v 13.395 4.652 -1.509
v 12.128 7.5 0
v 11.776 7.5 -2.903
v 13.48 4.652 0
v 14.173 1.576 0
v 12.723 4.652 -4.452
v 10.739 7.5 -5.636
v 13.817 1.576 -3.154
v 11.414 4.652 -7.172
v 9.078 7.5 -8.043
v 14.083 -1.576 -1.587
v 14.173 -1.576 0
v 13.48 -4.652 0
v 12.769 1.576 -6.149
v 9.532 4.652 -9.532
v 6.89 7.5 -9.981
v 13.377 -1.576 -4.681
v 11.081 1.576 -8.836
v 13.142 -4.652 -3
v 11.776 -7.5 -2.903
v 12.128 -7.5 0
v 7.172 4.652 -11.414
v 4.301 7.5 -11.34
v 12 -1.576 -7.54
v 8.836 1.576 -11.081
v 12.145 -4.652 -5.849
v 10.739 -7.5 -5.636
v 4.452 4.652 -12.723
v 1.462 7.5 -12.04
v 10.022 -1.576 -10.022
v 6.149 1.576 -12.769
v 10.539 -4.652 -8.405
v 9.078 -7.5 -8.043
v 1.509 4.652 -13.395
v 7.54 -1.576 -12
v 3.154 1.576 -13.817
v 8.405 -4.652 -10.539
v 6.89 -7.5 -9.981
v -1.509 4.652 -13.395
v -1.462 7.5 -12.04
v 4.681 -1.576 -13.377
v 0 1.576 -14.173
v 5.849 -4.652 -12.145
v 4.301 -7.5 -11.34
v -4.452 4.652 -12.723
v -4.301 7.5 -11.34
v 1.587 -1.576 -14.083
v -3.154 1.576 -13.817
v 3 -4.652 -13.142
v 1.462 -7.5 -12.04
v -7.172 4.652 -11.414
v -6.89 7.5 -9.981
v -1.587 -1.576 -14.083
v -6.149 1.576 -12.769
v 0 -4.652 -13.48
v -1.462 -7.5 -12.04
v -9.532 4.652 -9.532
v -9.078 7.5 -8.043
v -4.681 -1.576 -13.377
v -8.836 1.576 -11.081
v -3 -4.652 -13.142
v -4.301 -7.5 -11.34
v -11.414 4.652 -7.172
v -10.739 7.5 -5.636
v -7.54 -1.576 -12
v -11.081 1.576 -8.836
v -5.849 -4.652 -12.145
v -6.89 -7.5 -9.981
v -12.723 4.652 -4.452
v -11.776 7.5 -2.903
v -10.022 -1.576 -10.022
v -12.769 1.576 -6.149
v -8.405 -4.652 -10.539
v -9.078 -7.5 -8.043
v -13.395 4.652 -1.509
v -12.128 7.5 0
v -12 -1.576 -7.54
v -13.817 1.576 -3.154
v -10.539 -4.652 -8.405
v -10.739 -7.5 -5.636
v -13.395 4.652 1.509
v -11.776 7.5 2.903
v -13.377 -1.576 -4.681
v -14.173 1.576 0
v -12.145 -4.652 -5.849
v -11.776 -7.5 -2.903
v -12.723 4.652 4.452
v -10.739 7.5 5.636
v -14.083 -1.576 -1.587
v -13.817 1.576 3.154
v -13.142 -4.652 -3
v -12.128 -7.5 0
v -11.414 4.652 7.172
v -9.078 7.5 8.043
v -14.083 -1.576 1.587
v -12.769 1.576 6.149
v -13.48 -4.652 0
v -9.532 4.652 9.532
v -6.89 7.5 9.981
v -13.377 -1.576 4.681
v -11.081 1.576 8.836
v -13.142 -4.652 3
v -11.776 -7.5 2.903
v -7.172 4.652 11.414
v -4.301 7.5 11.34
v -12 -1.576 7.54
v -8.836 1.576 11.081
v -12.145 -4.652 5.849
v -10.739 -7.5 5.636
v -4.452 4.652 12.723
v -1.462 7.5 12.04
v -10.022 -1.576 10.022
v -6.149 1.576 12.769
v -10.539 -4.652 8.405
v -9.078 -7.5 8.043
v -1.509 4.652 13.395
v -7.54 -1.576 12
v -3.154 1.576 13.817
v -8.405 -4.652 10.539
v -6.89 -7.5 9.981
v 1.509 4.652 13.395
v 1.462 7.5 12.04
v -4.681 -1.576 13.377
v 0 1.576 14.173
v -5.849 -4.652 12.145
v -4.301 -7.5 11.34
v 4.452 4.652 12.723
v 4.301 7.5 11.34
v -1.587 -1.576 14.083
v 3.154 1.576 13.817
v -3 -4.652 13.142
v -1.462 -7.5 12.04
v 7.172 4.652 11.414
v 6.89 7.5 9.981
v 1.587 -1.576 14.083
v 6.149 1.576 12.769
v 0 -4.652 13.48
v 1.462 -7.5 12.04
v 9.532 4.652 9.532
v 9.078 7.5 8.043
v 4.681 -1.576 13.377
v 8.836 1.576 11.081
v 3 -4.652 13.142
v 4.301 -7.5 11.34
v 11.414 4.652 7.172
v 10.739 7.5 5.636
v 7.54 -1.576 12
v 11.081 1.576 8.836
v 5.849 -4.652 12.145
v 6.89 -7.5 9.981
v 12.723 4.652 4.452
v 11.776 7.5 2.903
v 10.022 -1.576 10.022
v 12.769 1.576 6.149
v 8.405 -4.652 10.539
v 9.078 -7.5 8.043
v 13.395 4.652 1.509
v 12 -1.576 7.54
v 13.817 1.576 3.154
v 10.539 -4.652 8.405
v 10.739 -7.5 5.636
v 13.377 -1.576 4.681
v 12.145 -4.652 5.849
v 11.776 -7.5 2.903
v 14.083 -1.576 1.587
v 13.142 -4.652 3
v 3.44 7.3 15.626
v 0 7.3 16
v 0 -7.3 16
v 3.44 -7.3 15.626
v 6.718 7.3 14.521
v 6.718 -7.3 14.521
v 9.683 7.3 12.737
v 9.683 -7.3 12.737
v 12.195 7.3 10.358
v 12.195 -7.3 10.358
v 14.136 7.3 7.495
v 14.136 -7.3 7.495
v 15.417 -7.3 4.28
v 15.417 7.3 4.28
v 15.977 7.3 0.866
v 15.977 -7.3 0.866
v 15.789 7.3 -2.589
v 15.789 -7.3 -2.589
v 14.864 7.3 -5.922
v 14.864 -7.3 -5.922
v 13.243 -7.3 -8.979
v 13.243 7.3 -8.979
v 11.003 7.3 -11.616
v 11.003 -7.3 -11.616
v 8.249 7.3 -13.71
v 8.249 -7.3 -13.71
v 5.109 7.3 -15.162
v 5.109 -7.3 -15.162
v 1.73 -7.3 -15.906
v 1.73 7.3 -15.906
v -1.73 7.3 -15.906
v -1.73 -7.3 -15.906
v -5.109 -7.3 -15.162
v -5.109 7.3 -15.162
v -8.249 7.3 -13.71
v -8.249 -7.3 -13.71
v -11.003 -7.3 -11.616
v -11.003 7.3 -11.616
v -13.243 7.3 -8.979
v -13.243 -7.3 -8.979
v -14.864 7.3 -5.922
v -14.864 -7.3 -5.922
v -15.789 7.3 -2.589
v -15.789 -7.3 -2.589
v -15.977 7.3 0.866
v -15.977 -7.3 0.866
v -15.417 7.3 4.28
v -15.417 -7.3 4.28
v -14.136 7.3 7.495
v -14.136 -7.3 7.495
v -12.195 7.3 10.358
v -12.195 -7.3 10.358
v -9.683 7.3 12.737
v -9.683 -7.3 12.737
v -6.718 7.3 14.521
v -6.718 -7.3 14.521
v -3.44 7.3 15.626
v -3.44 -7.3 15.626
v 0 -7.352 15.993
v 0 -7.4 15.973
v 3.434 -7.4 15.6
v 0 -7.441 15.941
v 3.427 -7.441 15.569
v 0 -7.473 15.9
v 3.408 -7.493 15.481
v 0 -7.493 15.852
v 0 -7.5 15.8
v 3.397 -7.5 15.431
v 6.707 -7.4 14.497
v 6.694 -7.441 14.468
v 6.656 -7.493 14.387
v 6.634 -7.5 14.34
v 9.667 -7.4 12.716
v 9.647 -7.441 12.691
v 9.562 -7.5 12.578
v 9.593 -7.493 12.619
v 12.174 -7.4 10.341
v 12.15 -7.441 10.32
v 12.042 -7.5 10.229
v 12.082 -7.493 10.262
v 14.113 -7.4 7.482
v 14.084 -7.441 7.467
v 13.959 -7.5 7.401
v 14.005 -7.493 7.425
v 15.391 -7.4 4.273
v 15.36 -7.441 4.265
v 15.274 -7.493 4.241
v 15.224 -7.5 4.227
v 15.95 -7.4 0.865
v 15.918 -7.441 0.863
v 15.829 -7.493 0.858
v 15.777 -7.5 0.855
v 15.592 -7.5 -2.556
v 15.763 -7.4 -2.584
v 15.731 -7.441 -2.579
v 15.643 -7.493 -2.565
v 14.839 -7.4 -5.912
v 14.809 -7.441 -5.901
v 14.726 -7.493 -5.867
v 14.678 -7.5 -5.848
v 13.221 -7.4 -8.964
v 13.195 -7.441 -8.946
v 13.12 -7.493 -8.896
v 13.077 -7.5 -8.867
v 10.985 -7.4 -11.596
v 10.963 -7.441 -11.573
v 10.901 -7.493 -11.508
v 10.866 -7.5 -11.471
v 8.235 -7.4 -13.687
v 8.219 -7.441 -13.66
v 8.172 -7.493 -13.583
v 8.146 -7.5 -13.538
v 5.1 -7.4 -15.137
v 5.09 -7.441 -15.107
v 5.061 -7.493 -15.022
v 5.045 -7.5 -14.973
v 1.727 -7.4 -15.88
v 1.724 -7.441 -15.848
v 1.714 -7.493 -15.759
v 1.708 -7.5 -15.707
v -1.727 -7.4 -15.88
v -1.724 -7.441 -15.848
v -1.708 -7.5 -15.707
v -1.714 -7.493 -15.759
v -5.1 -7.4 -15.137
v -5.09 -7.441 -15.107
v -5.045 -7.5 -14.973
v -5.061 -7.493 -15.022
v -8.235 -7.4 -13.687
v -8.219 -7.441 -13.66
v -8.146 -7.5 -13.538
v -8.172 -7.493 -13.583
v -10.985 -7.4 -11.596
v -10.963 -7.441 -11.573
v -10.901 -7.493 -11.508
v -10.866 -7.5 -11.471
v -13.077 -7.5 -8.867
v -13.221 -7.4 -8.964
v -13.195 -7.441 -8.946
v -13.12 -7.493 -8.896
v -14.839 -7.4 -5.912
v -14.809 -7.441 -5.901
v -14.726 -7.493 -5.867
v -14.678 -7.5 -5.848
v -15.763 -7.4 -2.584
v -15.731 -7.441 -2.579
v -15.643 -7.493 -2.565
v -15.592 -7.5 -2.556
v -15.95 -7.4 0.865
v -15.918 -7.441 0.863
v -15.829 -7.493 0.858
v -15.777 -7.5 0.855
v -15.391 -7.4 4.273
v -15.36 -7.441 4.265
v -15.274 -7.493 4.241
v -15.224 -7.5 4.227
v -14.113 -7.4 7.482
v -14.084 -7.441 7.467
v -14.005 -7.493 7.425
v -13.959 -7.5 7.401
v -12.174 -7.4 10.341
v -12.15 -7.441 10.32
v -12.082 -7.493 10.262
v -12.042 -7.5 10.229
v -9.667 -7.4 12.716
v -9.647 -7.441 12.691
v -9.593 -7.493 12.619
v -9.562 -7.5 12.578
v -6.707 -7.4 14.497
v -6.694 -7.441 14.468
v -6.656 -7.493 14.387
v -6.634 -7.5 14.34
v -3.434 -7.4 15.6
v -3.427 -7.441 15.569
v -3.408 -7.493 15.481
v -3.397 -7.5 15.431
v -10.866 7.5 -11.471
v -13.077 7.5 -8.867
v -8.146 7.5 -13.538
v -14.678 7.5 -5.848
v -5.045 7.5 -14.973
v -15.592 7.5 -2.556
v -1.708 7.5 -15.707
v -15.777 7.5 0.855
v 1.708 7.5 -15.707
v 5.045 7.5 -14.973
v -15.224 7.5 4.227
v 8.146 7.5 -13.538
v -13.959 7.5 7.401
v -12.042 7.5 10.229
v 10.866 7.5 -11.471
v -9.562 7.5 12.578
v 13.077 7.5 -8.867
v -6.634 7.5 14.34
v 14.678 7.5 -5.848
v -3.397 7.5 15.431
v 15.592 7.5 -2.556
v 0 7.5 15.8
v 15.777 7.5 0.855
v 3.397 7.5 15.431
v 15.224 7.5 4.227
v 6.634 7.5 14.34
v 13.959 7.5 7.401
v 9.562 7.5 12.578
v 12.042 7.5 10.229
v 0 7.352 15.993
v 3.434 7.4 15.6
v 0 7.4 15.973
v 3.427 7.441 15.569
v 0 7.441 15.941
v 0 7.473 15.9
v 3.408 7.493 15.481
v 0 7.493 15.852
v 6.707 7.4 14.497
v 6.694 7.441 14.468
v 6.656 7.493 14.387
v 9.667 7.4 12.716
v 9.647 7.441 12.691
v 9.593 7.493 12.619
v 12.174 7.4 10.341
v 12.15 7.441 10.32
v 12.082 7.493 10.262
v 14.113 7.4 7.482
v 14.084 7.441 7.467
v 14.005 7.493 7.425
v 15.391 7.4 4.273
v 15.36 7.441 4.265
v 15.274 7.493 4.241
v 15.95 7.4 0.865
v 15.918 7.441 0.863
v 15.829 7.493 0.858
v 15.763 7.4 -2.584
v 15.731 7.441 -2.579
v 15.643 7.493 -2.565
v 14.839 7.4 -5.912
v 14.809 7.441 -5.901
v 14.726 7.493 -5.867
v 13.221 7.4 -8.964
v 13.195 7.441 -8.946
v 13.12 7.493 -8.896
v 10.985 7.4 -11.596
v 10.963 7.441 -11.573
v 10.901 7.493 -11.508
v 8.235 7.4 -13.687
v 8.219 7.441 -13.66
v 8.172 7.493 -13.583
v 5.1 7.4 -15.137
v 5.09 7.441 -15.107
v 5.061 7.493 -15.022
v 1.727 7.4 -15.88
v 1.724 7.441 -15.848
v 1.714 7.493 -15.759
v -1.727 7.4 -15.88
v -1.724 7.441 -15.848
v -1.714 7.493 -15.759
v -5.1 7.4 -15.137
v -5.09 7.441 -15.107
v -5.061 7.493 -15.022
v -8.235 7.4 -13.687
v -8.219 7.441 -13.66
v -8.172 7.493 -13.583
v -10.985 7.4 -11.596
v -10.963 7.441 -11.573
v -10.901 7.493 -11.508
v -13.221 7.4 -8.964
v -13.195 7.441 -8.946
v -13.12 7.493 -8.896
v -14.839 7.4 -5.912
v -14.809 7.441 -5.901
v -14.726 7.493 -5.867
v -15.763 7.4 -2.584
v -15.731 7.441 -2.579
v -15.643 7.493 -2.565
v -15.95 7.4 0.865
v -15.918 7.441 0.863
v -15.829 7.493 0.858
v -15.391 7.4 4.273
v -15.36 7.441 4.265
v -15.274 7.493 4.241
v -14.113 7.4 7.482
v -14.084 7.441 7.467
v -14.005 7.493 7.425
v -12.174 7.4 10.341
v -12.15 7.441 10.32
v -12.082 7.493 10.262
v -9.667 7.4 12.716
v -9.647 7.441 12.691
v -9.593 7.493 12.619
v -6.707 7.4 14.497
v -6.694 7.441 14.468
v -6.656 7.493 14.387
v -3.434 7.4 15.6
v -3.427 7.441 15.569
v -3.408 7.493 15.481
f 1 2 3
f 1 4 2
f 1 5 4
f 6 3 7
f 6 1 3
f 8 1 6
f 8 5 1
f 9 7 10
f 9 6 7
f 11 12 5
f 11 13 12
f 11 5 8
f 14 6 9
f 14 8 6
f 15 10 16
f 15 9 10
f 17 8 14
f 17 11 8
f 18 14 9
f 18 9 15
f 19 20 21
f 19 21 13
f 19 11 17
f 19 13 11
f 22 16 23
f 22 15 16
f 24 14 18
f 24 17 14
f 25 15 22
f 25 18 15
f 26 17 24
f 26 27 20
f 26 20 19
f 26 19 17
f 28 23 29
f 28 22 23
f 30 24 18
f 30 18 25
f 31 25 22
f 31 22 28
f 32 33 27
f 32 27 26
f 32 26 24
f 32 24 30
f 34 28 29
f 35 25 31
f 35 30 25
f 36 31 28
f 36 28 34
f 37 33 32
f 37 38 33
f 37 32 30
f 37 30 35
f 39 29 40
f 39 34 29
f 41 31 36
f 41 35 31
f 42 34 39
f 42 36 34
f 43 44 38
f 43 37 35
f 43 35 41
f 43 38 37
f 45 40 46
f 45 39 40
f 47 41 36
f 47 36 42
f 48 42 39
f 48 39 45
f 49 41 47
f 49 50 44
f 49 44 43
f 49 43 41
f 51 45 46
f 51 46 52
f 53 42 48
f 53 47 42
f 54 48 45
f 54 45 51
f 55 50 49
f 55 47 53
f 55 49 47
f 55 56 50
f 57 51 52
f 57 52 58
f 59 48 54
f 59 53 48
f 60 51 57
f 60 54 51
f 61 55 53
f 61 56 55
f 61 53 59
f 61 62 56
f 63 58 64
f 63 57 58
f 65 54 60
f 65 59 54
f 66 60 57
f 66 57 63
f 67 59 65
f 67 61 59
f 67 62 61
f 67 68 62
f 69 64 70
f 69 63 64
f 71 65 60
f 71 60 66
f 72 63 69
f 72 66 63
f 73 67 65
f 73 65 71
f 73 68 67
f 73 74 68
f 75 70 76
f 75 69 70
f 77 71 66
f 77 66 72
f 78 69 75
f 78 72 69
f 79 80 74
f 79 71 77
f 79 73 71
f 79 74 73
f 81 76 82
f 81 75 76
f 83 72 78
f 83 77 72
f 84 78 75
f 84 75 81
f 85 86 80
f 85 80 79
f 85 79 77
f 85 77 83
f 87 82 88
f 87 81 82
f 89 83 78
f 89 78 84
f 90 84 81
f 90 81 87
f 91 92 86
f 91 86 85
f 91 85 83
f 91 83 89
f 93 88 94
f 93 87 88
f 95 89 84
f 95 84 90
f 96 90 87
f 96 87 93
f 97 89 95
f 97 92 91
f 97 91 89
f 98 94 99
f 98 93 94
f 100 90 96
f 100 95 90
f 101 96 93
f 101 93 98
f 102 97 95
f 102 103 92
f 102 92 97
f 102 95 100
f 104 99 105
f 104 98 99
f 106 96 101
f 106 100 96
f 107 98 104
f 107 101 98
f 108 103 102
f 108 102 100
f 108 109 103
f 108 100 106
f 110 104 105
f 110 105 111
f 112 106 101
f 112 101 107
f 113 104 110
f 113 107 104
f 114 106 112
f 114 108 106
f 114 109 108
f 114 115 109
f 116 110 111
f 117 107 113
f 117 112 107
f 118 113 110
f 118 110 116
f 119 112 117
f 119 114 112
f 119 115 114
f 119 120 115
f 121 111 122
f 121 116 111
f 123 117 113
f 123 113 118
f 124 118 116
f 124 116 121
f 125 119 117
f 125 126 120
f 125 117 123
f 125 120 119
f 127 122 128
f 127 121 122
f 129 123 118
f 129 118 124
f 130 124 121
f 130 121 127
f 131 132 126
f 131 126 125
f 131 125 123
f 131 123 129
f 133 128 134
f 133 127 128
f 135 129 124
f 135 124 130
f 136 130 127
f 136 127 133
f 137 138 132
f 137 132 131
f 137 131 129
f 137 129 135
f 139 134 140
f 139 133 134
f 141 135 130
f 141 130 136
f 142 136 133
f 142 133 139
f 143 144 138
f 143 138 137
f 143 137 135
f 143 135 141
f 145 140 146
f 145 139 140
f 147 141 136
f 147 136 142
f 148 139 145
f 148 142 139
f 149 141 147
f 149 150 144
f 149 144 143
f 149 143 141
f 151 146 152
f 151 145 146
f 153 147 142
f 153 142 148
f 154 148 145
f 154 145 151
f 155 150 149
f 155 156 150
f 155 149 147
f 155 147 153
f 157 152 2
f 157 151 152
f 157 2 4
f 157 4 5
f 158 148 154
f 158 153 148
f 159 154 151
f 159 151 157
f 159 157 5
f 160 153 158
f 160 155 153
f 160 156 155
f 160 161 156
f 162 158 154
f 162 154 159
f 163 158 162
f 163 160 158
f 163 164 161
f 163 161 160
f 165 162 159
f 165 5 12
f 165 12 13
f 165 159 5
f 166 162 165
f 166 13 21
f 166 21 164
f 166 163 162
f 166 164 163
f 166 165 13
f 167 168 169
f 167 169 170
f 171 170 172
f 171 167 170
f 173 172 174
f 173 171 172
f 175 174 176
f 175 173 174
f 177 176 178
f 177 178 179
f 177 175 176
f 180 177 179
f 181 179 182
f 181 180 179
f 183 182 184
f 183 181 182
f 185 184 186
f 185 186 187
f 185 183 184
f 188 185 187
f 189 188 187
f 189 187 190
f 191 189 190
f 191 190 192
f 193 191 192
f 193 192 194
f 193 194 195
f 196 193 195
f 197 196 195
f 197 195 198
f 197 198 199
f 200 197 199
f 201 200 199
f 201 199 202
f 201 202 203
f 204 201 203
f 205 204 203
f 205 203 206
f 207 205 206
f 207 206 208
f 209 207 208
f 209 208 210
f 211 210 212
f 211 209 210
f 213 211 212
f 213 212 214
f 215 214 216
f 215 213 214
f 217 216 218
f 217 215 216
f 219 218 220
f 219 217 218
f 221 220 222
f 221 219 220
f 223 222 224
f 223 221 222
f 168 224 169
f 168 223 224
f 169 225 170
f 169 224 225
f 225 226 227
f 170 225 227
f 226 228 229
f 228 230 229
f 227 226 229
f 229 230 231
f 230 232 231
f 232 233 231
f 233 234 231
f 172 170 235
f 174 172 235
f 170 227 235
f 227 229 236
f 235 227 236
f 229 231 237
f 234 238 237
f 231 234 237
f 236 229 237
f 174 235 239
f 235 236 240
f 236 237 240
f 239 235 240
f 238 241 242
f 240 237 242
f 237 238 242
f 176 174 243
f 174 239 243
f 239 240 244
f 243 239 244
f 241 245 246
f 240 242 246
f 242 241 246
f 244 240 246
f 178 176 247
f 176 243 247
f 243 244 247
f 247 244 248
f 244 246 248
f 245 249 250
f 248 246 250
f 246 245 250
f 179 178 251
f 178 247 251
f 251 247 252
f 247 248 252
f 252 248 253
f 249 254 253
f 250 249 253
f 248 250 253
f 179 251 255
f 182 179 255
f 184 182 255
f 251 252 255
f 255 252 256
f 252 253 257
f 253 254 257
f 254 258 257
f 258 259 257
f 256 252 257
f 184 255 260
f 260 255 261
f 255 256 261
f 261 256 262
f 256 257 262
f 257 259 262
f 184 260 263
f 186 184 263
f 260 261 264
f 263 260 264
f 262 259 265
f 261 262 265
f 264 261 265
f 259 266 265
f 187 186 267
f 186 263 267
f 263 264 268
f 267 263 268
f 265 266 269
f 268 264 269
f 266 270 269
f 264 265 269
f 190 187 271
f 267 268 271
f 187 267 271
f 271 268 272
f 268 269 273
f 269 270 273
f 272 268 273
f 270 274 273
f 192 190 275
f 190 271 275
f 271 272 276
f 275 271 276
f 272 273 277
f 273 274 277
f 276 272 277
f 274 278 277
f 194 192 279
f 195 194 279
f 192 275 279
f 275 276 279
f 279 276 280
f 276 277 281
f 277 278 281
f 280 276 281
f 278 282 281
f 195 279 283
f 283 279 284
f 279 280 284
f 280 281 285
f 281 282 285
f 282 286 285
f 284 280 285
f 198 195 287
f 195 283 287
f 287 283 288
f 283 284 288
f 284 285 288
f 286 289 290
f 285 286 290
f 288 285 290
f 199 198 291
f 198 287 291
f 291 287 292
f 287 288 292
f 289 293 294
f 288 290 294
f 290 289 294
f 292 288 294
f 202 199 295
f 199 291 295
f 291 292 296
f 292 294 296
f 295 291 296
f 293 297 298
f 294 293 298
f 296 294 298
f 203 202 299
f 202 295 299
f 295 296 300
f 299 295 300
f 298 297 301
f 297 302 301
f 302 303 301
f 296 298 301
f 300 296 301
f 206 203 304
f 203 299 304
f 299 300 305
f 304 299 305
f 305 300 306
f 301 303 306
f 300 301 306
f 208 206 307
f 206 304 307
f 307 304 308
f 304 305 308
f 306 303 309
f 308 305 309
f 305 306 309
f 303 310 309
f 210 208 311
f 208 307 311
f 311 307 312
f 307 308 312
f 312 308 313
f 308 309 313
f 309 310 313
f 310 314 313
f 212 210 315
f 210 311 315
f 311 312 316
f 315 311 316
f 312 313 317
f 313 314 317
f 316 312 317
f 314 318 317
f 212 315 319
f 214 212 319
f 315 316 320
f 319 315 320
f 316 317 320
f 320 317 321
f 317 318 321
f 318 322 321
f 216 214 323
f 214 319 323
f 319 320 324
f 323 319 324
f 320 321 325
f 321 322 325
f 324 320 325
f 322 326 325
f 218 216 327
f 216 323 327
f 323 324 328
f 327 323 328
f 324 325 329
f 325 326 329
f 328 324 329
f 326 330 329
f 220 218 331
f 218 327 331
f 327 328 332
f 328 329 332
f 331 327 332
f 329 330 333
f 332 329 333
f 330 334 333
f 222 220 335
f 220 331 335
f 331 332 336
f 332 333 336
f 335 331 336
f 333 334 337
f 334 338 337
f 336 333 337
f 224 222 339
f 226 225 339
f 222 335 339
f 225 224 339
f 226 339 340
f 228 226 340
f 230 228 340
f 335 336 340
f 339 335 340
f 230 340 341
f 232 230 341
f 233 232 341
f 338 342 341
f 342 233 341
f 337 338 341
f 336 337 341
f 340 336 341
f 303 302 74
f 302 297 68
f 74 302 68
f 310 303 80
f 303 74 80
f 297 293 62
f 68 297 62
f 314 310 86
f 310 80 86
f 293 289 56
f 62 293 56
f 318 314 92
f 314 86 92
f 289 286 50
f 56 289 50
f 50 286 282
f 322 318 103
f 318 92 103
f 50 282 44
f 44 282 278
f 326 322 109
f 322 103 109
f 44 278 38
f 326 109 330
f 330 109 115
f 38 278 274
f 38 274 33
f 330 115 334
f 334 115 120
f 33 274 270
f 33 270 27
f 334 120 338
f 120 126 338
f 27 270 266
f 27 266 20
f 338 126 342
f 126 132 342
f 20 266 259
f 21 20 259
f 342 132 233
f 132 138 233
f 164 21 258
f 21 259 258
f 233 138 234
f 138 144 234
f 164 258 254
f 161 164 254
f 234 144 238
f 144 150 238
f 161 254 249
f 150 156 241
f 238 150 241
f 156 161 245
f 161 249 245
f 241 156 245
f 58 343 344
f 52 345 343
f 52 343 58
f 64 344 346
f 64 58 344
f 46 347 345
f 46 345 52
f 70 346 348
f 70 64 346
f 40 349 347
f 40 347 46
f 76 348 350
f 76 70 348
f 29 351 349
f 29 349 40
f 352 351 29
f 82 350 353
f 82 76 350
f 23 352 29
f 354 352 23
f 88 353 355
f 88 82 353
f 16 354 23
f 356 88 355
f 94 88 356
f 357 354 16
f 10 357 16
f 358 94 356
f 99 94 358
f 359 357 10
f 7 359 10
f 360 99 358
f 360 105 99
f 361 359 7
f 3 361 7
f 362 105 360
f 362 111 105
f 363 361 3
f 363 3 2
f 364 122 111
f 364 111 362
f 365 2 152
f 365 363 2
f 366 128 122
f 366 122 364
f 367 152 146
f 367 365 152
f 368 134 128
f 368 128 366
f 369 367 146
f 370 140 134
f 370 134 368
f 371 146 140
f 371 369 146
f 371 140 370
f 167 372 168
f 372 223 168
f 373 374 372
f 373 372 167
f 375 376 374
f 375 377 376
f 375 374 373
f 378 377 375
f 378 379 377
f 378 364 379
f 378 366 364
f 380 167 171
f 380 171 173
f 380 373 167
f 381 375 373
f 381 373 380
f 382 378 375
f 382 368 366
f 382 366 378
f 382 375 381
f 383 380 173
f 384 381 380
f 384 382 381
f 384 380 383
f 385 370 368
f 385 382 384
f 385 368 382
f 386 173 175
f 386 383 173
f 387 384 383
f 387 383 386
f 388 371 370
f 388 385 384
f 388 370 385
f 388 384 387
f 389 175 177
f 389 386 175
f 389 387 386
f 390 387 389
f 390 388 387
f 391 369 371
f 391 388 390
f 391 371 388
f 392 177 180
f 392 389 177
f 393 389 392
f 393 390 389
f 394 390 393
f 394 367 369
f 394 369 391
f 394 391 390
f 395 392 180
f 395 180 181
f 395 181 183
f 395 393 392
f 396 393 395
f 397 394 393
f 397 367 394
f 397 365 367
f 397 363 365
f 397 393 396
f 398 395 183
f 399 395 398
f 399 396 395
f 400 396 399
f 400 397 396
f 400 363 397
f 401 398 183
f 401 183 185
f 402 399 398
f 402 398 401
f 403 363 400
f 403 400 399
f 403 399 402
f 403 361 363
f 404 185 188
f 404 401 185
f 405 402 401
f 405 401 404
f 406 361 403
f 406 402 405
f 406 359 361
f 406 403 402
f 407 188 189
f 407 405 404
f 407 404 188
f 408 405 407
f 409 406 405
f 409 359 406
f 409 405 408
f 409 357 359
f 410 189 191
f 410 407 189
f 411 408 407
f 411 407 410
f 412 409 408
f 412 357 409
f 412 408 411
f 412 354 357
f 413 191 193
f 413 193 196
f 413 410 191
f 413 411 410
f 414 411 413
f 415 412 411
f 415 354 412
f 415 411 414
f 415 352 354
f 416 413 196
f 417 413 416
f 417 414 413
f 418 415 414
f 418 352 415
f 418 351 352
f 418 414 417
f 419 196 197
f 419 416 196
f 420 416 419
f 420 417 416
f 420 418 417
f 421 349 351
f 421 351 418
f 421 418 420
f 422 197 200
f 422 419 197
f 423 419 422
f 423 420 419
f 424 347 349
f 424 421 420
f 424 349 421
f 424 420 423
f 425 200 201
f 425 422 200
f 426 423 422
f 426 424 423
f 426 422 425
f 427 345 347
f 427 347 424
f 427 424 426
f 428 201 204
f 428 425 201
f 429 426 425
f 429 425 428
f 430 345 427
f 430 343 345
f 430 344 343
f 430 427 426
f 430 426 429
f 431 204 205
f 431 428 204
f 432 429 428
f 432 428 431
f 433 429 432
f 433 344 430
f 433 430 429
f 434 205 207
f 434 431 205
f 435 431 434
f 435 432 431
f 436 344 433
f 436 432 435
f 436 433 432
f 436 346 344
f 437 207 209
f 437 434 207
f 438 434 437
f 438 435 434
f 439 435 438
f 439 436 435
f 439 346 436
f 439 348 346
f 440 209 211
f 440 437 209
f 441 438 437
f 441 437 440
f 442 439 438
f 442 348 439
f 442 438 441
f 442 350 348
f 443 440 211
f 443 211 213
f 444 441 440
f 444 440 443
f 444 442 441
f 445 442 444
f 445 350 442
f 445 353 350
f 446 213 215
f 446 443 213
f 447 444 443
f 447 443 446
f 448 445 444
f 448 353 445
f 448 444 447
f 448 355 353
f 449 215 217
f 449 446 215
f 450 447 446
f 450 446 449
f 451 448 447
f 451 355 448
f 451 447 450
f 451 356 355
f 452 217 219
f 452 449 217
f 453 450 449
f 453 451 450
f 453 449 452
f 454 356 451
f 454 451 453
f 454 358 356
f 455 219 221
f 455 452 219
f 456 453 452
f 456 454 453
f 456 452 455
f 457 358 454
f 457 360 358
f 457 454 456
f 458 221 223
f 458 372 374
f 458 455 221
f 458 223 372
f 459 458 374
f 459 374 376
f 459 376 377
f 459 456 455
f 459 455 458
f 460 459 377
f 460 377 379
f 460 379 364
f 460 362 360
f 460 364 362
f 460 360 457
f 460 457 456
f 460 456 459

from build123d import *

# Parameters (mm, degrees)
SZKIC1_R                    = 16
DODANIE_WYCI_GNI_CIE1_DEPTH = 7.5
ZAOKR_GLENIE1_R             = 0.2


with BuildPart() as part:
    # Szkic1 → Dodanie-wyciągnięcie1 (new, symmetric)
    with BuildSketch(Plane(origin=(0, 0, 0), x_dir=(1, 0, 0), z_dir=(0, 1, 0))):
        with Locations(Location((0, 0, 0), (0, 0, 270))):
            Circle(SZKIC1_R)
    extrude(amount=DODANIE_WYCI_GNI_CIE1_DEPTH, both=True)

    # Szkic3 → Wycięcie-obrót1 (revolve, cut)
    with BuildSketch(Plane.XY):
        with BuildLine():
            Line((0, -14.26), (0, 14.26))
            ThreePointArc((0, 14.26), (14.26, 0), (0, -14.26))
        make_face()
    revolve(axis=Axis((0, -14.26, 0), (0, 1, 0)), mode=Mode.SUBTRACT)

    # Zaokrąglenie1
    zaokr_glenie1_edges = [part.edges().sort_by_distance(p)[0] for p in [
        (0, -7.5, -16),
        (0, 7.5, -16),
    ]]
    fillet(zaokr_glenie1_edges, radius=ZAOKR_GLENIE1_R)


solid = part.part
